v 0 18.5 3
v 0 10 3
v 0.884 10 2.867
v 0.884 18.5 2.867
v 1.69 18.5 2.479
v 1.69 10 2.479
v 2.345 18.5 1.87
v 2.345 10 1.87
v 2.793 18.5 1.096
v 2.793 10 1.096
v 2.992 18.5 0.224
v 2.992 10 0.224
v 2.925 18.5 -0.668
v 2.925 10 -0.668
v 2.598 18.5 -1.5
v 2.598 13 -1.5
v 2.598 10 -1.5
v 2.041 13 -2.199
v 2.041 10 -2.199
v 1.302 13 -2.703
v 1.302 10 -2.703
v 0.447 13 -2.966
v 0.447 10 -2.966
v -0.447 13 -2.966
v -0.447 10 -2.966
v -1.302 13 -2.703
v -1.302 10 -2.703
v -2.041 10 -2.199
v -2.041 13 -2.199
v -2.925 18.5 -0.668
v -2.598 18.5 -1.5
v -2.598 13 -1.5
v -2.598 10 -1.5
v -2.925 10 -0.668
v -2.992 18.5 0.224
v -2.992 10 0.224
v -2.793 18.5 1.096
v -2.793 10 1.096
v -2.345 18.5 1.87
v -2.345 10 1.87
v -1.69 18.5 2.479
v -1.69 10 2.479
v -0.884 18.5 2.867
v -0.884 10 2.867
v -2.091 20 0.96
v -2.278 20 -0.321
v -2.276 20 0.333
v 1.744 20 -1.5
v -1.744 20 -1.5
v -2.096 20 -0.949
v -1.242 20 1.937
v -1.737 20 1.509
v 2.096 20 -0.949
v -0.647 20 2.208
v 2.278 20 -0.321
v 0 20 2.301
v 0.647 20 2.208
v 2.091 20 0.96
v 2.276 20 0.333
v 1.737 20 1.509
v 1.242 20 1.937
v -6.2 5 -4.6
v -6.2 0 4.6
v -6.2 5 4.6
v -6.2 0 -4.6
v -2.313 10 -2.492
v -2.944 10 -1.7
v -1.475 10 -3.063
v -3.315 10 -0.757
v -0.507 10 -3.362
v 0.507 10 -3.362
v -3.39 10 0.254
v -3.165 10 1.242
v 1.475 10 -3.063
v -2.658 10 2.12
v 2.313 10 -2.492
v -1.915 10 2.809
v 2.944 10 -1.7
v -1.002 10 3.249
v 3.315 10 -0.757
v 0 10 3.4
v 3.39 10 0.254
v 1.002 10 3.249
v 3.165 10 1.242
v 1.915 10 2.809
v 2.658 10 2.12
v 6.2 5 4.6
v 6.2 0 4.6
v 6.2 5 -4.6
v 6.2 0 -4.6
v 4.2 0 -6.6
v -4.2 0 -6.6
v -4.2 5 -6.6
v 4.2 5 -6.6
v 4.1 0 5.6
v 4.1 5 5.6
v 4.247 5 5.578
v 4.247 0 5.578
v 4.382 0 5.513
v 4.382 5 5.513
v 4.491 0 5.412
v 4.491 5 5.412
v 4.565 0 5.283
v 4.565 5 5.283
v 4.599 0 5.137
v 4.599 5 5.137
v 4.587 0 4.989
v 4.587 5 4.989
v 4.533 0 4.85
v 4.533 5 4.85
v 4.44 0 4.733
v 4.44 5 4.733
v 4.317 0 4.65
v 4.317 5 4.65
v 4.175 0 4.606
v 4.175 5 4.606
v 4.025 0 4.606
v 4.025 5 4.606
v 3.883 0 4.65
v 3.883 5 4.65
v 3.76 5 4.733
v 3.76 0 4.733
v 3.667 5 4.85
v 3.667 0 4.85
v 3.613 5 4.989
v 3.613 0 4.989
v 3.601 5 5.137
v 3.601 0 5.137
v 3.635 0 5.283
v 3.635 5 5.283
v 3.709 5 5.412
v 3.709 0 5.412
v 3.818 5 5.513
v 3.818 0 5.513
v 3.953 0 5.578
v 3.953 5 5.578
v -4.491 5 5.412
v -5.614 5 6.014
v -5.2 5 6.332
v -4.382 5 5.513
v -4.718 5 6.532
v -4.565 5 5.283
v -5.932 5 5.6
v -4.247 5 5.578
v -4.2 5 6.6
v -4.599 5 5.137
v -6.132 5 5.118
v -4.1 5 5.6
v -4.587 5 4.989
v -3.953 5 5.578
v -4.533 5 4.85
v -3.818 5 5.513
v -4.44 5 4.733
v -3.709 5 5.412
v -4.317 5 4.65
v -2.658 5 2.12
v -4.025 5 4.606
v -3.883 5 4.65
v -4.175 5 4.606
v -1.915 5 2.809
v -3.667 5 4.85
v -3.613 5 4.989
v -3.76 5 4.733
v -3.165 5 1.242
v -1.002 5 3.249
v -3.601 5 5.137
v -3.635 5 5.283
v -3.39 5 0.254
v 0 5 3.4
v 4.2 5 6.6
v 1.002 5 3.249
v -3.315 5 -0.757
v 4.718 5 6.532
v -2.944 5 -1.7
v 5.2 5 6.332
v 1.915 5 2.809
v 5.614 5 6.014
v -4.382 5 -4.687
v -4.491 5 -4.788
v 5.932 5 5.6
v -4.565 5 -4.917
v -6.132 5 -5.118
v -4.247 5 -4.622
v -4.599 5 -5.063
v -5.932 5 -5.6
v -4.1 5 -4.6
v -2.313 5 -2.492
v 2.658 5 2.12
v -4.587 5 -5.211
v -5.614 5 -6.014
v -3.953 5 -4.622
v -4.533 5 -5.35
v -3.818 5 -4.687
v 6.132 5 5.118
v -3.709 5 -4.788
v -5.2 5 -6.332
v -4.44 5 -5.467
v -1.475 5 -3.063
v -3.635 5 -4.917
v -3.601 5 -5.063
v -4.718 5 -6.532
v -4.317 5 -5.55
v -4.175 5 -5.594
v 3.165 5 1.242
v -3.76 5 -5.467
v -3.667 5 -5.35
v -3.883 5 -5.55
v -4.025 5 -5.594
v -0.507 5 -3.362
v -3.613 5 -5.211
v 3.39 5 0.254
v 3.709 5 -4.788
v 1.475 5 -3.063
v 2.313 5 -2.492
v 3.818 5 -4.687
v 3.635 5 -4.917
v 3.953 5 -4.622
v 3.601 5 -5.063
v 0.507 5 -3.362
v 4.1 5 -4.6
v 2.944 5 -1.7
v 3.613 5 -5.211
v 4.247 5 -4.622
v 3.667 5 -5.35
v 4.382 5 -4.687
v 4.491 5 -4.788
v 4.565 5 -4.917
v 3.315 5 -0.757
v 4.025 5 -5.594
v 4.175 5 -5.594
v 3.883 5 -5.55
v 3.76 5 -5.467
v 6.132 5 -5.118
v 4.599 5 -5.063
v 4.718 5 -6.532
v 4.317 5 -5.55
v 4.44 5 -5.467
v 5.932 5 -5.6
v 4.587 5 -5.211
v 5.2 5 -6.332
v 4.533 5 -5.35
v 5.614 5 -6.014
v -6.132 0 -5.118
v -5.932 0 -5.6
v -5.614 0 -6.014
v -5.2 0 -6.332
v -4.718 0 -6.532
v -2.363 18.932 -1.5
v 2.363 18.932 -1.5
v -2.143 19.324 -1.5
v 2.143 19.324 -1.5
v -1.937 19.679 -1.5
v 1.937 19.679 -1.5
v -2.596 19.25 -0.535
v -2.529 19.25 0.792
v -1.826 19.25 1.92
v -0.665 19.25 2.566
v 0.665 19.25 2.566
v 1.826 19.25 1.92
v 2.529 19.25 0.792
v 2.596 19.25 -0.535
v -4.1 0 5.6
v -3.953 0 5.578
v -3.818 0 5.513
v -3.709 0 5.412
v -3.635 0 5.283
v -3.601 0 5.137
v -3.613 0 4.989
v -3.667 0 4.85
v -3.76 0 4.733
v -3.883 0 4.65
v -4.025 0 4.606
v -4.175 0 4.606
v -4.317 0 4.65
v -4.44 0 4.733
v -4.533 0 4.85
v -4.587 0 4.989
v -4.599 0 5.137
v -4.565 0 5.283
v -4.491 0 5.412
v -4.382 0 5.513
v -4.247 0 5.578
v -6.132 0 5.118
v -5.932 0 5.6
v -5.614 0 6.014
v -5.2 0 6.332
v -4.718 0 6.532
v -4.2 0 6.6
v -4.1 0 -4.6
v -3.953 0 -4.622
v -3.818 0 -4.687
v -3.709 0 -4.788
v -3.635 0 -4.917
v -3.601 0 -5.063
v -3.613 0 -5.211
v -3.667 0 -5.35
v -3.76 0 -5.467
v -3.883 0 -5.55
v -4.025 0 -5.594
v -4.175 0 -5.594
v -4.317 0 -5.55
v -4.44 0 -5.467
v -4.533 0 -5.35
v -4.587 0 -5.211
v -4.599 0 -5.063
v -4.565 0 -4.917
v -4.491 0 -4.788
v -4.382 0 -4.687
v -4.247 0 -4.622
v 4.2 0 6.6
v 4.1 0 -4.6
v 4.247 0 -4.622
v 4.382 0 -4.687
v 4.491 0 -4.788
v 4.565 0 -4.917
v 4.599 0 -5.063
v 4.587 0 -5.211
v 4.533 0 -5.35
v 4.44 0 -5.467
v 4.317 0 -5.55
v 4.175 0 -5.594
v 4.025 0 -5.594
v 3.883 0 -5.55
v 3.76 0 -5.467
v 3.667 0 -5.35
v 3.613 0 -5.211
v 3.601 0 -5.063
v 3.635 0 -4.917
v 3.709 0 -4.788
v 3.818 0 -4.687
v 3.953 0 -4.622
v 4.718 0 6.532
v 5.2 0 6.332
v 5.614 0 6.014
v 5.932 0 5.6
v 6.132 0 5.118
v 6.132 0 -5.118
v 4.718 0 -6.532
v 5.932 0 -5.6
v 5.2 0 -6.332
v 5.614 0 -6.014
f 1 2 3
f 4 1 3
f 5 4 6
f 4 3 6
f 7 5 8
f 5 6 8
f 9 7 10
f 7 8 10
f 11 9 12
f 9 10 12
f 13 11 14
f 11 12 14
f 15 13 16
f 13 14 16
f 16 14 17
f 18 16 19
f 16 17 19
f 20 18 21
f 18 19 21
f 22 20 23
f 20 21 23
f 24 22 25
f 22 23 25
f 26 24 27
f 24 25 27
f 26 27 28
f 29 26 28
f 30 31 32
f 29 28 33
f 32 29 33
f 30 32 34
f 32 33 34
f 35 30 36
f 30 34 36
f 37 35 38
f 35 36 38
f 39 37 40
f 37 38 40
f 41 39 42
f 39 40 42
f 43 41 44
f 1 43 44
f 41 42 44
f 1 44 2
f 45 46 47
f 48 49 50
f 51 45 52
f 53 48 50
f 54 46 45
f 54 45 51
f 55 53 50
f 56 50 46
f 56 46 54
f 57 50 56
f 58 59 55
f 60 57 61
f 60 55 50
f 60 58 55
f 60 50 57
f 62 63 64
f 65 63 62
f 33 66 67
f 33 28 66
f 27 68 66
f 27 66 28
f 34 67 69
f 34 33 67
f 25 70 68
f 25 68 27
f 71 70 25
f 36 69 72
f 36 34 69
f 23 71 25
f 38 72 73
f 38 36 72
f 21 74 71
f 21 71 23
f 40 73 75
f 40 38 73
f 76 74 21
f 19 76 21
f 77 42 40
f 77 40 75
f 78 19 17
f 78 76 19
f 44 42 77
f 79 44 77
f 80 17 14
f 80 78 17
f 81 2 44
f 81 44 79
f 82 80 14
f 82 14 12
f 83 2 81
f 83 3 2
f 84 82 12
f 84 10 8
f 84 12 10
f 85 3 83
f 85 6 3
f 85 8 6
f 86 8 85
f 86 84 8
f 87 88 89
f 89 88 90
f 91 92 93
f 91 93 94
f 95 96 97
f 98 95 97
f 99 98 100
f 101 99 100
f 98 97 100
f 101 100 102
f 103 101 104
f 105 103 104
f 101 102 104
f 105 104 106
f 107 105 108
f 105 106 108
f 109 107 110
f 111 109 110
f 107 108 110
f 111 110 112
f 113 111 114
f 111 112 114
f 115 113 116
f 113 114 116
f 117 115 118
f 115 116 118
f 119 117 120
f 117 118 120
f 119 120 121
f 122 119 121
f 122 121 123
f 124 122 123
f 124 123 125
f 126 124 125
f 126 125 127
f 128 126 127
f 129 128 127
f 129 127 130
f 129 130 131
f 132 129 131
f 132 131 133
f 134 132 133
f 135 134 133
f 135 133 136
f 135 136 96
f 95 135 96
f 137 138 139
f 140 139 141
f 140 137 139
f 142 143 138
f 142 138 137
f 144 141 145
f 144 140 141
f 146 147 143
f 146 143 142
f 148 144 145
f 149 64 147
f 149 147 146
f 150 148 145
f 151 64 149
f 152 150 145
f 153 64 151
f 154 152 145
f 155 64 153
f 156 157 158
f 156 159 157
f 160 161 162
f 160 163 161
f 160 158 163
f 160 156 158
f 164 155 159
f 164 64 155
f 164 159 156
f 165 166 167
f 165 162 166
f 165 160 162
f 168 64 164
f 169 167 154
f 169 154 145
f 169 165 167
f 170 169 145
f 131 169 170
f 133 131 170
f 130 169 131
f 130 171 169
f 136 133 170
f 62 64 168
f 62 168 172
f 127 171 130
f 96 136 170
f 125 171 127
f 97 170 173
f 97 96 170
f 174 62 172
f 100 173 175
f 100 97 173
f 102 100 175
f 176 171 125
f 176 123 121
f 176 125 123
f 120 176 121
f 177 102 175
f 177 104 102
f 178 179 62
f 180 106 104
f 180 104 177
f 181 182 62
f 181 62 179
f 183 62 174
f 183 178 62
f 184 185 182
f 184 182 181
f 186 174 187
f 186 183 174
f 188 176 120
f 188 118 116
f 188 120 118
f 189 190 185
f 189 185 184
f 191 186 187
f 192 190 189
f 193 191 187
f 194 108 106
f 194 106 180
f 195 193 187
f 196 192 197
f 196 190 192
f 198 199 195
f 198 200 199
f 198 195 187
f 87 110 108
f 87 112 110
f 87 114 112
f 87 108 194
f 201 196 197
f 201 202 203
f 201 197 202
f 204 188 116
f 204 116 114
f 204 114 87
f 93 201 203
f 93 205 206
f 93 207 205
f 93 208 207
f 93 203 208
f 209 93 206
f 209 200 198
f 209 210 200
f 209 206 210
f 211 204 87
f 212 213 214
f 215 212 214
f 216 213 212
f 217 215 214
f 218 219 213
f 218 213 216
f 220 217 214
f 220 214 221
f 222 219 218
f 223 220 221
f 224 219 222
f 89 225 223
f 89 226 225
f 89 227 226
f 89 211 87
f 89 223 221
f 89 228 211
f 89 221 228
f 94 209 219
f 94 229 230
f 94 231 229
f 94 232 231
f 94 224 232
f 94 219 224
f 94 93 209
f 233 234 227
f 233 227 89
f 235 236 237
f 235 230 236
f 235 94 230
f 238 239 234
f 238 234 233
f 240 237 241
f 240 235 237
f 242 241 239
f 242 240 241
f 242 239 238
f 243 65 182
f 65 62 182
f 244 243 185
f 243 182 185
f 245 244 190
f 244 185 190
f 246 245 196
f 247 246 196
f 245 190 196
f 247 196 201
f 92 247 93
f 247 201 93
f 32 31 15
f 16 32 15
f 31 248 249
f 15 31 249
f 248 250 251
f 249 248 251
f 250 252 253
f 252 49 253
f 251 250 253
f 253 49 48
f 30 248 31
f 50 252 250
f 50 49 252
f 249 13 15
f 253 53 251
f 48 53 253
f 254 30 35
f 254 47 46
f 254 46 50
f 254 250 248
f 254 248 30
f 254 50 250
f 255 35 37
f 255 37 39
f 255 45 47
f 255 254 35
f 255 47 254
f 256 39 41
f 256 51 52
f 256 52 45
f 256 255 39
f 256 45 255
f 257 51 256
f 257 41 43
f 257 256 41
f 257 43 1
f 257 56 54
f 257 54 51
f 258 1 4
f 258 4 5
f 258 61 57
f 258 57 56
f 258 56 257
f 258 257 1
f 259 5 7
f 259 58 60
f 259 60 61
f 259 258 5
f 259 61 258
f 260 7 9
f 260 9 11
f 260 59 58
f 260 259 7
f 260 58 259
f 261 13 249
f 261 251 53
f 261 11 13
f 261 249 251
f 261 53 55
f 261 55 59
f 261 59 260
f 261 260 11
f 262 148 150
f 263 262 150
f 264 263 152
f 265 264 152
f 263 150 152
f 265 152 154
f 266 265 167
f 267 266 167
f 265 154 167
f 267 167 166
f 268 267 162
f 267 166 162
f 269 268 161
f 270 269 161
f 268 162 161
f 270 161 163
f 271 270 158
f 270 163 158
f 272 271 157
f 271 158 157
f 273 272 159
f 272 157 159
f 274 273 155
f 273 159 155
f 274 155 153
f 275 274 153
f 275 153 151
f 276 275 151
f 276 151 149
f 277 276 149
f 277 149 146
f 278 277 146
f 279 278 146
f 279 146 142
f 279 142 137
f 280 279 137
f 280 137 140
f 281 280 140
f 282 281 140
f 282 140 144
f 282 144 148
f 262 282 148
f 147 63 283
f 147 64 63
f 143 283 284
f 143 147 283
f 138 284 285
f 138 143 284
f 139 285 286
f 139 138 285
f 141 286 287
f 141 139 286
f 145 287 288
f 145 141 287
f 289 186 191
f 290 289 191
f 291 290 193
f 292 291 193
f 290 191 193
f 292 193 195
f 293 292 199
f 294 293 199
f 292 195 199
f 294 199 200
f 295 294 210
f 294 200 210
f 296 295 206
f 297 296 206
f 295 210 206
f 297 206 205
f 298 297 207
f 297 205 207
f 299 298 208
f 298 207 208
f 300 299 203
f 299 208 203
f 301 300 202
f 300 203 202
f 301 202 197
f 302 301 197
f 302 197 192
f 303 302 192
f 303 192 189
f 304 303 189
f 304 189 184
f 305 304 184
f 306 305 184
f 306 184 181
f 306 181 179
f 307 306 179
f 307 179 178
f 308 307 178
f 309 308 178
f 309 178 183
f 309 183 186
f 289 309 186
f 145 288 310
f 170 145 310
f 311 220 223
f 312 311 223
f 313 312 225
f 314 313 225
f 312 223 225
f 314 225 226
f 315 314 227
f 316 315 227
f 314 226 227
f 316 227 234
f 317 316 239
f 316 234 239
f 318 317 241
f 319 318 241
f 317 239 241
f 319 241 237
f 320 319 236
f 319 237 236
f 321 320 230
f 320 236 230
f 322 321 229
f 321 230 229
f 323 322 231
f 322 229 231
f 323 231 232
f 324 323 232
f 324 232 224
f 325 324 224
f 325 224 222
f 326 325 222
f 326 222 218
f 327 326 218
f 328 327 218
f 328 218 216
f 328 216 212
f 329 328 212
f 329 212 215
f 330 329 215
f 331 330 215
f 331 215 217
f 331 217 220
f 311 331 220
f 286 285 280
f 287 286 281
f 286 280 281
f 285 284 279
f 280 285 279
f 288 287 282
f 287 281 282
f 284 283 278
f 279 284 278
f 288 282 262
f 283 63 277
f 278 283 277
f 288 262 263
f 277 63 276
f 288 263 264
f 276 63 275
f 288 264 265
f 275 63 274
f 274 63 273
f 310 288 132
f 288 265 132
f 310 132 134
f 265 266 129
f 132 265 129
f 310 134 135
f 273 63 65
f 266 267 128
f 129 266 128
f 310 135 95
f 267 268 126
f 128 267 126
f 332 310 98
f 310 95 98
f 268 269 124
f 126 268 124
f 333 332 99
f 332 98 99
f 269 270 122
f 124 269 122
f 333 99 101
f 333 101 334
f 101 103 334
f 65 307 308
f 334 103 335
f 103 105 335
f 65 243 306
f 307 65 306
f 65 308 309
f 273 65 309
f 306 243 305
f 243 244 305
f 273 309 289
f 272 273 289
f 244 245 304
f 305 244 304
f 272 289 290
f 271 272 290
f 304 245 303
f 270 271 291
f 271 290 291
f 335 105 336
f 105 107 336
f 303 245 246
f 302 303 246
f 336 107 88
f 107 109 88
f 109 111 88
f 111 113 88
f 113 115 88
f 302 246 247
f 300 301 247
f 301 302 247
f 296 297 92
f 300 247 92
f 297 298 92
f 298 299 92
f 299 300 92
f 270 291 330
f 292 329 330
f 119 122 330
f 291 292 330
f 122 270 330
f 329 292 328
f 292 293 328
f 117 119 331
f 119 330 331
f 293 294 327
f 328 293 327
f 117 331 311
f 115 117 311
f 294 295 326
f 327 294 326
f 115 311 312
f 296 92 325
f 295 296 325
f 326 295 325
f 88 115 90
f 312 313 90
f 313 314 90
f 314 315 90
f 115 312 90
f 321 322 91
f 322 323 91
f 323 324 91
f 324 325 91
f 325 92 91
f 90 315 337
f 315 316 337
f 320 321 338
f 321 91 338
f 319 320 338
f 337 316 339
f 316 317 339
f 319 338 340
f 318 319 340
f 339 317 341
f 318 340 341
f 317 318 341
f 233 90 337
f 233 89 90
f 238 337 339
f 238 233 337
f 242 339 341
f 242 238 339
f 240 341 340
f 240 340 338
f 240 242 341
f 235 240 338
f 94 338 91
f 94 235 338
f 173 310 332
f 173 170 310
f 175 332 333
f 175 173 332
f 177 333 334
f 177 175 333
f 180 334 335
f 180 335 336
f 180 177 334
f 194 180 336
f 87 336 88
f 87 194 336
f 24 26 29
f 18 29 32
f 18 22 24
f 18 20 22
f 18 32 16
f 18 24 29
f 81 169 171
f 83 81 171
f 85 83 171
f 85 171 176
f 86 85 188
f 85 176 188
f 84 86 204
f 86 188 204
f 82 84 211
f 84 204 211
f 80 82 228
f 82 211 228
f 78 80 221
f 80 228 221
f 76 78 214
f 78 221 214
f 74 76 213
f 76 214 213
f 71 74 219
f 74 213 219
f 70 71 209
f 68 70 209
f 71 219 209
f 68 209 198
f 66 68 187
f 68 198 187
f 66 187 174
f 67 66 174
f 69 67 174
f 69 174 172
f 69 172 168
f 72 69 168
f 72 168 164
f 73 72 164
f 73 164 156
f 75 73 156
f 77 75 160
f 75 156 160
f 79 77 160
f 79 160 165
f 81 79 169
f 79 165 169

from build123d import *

# Parameters (mm, degrees)
SKETCH1_W           = 12.4
SKETCH1_H           = 13.2
BOSS_EXTRUDE1_DEPTH = 5
FILLET1_R           = 2
SKETCH2_R           = 3.4
BOSS_EXTRUDE2_DEPTH = 5
SKETCH3_R           = 3
BOSS_EXTRUDE3_DEPTH = 10
CHAMFER1_SIZE       = 1.5
CHAMFER1_SIZE2      = 0.699461487
SKETCH4_R           = 0.5
CUT_EXTRUDE1_DEPTH  = 18.521415468
SKETCH5_W           = 6.05122926
SKETCH5_H           = 1.5
CUT_EXTRUDE2_DEPTH  = 7


with BuildPart() as part:
    # Sketch1 → Boss-Extrude1 (new body)
    with BuildSketch(Plane(origin=(0, 0, 0), x_dir=(1, 0, 0), z_dir=(0, 1, 0))):
        Rectangle(SKETCH1_W, SKETCH1_H)
    extrude(amount=BOSS_EXTRUDE1_DEPTH)

    # Fillet1
    fillet1_edges = [part.edges().sort_by_distance(p)[0] for p in [
        (-6.2, 2.5, -6.6),
        (6.2, 2.5, -6.6),
        (6.2, 2.5, 6.6),
        (-6.2, 2.5, 6.6),
    ]]
    fillet(fillet1_edges, radius=FILLET1_R)

    # Sketch2 → Boss-Extrude2 (add)
    with BuildSketch(Plane(origin=(0, 5, 0), x_dir=(1, 0, 0), z_dir=(0, 1, 0))):
        with Locations(Location((0, 0, 0), (0, 0, 270))):
            Circle(SKETCH2_R)
    extrude(amount=BOSS_EXTRUDE2_DEPTH)

    # Sketch3 → Boss-Extrude3 (add)
    with BuildSketch(Plane(origin=(0, 10, 0), x_dir=(1, 0, 0), z_dir=(0, 1, 0))):
        with Locations(Location((0, 0, 0), (0, 0, 270))):
            Circle(SKETCH3_R)
    extrude(amount=BOSS_EXTRUDE3_DEPTH)

    # Chamfer1
    chamfer1_edges = [part.edges().sort_by_distance(p)[0] for p in [
        (0, 20, -3),
    ]]
    chamfer1_side = [part.faces().sort_by_distance(p)[0] for p in [
        (0, 15, -3),
    ]]
    chamfer(chamfer1_edges, length=CHAMFER1_SIZE, length2=CHAMFER1_SIZE2, reference=chamfer1_side[0])

    # Sketch4 → Cut-Extrude1 (cut, through all)
    with BuildSketch(Plane(origin=(0, 5, 0), x_dir=(1, 0, 0), z_dir=(0, 1, 0))):
        with Locations(Location((4.1, -5.1, 0), (0, 0, 270))):
            Circle(SKETCH4_R)
        with Locations(Location((-4.1, -5.1, 0), (0, 0, 270))):
            Circle(SKETCH4_R)
        with Locations(Location((-4.1, 5.1, 0), (0, 0, 270))):
            Circle(SKETCH4_R)
        with Locations(Location((4.1, 5.1, 0), (0, 0, 270))):
            Circle(SKETCH4_R)
    extrude(amount=-CUT_EXTRUDE1_DEPTH, mode=Mode.SUBTRACT)

    # Sketch5 → Cut-Extrude2 (cut)
    with BuildSketch(Plane(origin=(0, 20, 0), x_dir=(1, 0, 0), z_dir=(0, 1, 0))):
        with Locations((0.02561463, 2.25)):
            Rectangle(SKETCH5_W, SKETCH5_H)
    extrude(amount=-CUT_EXTRUDE2_DEPTH, mode=Mode.SUBTRACT)


solid = part.part
